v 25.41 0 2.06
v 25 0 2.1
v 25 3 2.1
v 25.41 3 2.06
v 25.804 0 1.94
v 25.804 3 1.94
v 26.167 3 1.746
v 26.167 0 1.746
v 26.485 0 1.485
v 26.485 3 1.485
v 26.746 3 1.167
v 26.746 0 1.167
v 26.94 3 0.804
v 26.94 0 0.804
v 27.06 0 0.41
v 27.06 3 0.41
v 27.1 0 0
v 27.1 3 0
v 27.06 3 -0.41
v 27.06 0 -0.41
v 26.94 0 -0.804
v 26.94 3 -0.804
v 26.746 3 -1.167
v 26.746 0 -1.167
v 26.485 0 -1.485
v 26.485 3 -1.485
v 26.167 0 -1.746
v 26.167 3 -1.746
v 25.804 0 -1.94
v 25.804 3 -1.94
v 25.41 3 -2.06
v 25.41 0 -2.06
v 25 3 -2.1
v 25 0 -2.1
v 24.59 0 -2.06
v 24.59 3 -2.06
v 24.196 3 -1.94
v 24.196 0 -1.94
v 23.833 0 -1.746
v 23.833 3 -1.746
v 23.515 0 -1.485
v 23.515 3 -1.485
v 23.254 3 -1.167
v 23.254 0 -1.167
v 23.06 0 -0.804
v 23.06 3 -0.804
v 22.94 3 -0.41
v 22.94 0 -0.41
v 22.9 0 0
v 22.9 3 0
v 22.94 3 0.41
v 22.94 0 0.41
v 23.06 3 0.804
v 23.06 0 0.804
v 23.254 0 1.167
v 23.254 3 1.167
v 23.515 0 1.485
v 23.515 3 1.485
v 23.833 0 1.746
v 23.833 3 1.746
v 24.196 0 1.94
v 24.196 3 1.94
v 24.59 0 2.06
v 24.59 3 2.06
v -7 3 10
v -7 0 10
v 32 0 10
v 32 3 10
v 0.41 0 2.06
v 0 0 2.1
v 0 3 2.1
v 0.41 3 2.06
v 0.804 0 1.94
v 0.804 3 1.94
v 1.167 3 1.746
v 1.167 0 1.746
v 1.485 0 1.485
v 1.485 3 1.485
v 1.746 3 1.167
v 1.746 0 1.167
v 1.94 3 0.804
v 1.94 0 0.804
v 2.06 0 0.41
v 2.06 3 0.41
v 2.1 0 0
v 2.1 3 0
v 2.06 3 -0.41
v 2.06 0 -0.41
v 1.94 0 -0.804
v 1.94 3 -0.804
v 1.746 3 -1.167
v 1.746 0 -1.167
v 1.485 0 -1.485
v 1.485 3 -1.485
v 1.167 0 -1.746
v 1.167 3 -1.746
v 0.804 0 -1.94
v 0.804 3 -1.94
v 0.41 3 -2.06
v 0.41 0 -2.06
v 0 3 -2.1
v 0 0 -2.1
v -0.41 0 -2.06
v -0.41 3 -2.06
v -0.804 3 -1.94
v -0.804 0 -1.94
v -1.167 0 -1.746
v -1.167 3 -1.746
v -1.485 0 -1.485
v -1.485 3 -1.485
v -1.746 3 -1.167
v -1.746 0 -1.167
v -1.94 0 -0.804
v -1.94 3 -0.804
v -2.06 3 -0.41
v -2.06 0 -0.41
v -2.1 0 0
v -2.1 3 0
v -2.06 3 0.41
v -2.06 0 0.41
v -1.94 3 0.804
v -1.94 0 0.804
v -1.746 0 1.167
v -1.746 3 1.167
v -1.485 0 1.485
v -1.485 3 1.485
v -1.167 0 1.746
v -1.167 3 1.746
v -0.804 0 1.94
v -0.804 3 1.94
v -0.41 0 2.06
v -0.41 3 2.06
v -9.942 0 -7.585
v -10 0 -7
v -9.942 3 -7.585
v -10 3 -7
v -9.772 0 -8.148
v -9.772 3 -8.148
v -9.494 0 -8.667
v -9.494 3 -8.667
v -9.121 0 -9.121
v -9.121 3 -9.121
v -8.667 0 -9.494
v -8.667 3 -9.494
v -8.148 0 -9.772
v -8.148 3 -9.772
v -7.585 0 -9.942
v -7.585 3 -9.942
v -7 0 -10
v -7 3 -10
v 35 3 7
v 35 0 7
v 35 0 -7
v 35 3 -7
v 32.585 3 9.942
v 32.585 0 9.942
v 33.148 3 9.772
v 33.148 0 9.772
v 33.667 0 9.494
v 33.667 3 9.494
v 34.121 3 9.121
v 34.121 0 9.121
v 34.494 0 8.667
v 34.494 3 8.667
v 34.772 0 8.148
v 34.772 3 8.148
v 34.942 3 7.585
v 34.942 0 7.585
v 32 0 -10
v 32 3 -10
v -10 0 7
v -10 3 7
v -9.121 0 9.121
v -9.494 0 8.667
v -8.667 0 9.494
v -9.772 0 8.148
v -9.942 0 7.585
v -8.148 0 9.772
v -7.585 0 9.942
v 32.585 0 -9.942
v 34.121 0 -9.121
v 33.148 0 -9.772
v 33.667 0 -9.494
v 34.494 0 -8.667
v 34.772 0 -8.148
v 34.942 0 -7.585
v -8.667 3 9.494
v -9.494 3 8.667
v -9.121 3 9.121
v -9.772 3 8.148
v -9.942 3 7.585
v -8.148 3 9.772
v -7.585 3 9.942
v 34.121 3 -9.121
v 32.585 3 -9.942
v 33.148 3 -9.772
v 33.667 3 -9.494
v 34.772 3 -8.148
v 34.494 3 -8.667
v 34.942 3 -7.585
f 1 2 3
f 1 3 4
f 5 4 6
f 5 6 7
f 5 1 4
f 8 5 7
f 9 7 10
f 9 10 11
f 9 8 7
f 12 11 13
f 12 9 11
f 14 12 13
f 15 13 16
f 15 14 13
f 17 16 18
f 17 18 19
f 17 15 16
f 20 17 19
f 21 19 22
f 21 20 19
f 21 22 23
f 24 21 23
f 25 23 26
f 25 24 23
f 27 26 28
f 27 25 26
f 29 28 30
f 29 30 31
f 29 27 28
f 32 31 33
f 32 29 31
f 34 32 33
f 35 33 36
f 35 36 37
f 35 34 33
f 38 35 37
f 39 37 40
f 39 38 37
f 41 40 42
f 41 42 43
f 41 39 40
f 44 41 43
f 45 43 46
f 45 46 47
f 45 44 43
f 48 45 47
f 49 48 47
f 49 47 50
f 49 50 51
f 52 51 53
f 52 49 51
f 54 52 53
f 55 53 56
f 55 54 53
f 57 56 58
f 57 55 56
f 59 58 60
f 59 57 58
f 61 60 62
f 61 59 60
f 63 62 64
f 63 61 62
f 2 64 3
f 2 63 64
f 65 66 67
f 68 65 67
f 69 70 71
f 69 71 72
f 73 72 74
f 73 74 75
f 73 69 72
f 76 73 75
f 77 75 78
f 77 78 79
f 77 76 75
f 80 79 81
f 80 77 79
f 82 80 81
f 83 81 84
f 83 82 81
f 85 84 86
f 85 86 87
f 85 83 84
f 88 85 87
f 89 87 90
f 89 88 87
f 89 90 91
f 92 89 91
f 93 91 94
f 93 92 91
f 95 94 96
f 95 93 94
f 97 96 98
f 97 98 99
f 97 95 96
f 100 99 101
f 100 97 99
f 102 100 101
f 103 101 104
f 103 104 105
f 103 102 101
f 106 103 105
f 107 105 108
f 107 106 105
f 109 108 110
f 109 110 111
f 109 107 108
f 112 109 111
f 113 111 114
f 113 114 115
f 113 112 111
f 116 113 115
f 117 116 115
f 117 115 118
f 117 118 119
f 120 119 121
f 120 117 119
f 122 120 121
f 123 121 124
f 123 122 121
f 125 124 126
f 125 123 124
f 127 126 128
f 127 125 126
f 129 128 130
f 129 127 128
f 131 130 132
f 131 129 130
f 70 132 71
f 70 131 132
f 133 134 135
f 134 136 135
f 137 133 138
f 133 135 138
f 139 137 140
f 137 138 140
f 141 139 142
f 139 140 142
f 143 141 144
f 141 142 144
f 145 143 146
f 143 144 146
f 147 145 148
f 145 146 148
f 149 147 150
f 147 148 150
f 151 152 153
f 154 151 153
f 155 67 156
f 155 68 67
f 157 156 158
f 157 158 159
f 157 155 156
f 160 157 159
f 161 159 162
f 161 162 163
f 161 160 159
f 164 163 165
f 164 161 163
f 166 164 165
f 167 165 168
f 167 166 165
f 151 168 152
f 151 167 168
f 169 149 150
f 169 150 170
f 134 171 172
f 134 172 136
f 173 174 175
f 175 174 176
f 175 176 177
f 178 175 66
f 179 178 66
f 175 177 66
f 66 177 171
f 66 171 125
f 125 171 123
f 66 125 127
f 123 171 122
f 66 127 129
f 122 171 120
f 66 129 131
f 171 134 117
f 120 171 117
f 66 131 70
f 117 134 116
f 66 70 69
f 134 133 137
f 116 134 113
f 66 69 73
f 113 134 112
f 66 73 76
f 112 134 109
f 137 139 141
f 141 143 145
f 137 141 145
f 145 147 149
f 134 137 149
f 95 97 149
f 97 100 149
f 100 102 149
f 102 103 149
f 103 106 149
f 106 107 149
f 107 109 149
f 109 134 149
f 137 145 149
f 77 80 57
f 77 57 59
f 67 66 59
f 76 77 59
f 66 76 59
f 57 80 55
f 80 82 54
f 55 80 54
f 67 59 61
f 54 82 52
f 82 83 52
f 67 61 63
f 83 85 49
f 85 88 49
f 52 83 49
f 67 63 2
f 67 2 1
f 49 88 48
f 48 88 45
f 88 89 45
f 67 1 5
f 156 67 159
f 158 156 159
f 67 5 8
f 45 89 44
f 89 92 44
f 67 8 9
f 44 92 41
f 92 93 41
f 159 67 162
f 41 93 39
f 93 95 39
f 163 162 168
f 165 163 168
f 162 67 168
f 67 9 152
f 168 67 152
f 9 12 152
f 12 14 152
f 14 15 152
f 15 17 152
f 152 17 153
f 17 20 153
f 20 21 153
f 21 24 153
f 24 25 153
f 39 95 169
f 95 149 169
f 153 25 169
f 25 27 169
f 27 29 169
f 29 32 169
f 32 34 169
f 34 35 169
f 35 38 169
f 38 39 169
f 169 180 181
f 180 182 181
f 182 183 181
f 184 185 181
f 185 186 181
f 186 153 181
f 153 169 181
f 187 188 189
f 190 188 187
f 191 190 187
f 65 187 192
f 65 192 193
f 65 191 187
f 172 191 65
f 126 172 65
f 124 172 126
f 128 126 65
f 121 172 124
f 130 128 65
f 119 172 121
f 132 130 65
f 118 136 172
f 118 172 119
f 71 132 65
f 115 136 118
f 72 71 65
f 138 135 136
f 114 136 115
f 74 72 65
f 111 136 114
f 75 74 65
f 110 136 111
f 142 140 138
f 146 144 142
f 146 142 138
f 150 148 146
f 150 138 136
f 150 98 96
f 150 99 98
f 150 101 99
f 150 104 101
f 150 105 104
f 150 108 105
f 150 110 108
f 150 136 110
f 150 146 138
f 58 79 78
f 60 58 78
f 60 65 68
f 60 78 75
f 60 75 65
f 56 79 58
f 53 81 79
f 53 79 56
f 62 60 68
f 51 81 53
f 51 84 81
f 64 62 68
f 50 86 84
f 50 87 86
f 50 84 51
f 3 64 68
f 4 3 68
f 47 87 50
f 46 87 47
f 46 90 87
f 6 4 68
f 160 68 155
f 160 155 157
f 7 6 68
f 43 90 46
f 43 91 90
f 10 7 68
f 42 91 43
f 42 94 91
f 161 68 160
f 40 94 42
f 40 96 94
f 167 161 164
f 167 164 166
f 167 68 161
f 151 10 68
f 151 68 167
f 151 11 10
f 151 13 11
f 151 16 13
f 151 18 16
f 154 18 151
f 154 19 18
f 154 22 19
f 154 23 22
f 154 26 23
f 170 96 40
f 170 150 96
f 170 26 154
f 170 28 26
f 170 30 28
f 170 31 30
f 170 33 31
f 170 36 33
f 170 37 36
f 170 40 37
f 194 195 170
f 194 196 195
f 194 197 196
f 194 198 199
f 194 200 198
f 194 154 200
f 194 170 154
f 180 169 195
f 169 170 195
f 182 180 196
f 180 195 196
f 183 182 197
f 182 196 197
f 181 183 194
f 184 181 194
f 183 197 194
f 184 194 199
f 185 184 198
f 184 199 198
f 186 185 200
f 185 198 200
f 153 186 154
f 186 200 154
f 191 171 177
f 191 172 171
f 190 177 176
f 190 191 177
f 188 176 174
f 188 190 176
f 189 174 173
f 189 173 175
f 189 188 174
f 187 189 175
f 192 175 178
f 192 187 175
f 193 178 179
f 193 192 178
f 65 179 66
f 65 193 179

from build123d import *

# Parameters (mm, degrees)
SKETCH_1_W      = 45
SKETCH_1_H      = 20
SKETCH_1_R      = 2.1
EXTRUDE_1_DEPTH = 3
FILLET_1_R      = 3


with BuildPart() as part:
    # 草图1 → 凸台-拉伸1 (new body)
    with BuildSketch(Plane(origin=(0, 0, 0), x_dir=(1, 0, 0), z_dir=(0, 1, 0))):
        with Locations((12.5, 0)):
            Rectangle(SKETCH_1_W, SKETCH_1_H)
        with Locations(Location((0, 0, 0), (0, 0, 270))):
            Circle(SKETCH_1_R, mode=Mode.SUBTRACT)
        with Locations(Location((25, 0, 0), (0, 0, 270))):
            Circle(SKETCH_1_R, mode=Mode.SUBTRACT)
    extrude(amount=EXTRUDE_1_DEPTH)

    # 圆角1
    fillet_1_edges = [part.edges().sort_by_distance(p)[0] for p in [
        (35, 1.5, 10),
        (-10, 1.5, 10),
        (-10, 1.5, -10),
        (35, 1.5, -10),
    ]]
    fillet(fillet_1_edges, radius=FILLET_1_R)


solid = part.part
